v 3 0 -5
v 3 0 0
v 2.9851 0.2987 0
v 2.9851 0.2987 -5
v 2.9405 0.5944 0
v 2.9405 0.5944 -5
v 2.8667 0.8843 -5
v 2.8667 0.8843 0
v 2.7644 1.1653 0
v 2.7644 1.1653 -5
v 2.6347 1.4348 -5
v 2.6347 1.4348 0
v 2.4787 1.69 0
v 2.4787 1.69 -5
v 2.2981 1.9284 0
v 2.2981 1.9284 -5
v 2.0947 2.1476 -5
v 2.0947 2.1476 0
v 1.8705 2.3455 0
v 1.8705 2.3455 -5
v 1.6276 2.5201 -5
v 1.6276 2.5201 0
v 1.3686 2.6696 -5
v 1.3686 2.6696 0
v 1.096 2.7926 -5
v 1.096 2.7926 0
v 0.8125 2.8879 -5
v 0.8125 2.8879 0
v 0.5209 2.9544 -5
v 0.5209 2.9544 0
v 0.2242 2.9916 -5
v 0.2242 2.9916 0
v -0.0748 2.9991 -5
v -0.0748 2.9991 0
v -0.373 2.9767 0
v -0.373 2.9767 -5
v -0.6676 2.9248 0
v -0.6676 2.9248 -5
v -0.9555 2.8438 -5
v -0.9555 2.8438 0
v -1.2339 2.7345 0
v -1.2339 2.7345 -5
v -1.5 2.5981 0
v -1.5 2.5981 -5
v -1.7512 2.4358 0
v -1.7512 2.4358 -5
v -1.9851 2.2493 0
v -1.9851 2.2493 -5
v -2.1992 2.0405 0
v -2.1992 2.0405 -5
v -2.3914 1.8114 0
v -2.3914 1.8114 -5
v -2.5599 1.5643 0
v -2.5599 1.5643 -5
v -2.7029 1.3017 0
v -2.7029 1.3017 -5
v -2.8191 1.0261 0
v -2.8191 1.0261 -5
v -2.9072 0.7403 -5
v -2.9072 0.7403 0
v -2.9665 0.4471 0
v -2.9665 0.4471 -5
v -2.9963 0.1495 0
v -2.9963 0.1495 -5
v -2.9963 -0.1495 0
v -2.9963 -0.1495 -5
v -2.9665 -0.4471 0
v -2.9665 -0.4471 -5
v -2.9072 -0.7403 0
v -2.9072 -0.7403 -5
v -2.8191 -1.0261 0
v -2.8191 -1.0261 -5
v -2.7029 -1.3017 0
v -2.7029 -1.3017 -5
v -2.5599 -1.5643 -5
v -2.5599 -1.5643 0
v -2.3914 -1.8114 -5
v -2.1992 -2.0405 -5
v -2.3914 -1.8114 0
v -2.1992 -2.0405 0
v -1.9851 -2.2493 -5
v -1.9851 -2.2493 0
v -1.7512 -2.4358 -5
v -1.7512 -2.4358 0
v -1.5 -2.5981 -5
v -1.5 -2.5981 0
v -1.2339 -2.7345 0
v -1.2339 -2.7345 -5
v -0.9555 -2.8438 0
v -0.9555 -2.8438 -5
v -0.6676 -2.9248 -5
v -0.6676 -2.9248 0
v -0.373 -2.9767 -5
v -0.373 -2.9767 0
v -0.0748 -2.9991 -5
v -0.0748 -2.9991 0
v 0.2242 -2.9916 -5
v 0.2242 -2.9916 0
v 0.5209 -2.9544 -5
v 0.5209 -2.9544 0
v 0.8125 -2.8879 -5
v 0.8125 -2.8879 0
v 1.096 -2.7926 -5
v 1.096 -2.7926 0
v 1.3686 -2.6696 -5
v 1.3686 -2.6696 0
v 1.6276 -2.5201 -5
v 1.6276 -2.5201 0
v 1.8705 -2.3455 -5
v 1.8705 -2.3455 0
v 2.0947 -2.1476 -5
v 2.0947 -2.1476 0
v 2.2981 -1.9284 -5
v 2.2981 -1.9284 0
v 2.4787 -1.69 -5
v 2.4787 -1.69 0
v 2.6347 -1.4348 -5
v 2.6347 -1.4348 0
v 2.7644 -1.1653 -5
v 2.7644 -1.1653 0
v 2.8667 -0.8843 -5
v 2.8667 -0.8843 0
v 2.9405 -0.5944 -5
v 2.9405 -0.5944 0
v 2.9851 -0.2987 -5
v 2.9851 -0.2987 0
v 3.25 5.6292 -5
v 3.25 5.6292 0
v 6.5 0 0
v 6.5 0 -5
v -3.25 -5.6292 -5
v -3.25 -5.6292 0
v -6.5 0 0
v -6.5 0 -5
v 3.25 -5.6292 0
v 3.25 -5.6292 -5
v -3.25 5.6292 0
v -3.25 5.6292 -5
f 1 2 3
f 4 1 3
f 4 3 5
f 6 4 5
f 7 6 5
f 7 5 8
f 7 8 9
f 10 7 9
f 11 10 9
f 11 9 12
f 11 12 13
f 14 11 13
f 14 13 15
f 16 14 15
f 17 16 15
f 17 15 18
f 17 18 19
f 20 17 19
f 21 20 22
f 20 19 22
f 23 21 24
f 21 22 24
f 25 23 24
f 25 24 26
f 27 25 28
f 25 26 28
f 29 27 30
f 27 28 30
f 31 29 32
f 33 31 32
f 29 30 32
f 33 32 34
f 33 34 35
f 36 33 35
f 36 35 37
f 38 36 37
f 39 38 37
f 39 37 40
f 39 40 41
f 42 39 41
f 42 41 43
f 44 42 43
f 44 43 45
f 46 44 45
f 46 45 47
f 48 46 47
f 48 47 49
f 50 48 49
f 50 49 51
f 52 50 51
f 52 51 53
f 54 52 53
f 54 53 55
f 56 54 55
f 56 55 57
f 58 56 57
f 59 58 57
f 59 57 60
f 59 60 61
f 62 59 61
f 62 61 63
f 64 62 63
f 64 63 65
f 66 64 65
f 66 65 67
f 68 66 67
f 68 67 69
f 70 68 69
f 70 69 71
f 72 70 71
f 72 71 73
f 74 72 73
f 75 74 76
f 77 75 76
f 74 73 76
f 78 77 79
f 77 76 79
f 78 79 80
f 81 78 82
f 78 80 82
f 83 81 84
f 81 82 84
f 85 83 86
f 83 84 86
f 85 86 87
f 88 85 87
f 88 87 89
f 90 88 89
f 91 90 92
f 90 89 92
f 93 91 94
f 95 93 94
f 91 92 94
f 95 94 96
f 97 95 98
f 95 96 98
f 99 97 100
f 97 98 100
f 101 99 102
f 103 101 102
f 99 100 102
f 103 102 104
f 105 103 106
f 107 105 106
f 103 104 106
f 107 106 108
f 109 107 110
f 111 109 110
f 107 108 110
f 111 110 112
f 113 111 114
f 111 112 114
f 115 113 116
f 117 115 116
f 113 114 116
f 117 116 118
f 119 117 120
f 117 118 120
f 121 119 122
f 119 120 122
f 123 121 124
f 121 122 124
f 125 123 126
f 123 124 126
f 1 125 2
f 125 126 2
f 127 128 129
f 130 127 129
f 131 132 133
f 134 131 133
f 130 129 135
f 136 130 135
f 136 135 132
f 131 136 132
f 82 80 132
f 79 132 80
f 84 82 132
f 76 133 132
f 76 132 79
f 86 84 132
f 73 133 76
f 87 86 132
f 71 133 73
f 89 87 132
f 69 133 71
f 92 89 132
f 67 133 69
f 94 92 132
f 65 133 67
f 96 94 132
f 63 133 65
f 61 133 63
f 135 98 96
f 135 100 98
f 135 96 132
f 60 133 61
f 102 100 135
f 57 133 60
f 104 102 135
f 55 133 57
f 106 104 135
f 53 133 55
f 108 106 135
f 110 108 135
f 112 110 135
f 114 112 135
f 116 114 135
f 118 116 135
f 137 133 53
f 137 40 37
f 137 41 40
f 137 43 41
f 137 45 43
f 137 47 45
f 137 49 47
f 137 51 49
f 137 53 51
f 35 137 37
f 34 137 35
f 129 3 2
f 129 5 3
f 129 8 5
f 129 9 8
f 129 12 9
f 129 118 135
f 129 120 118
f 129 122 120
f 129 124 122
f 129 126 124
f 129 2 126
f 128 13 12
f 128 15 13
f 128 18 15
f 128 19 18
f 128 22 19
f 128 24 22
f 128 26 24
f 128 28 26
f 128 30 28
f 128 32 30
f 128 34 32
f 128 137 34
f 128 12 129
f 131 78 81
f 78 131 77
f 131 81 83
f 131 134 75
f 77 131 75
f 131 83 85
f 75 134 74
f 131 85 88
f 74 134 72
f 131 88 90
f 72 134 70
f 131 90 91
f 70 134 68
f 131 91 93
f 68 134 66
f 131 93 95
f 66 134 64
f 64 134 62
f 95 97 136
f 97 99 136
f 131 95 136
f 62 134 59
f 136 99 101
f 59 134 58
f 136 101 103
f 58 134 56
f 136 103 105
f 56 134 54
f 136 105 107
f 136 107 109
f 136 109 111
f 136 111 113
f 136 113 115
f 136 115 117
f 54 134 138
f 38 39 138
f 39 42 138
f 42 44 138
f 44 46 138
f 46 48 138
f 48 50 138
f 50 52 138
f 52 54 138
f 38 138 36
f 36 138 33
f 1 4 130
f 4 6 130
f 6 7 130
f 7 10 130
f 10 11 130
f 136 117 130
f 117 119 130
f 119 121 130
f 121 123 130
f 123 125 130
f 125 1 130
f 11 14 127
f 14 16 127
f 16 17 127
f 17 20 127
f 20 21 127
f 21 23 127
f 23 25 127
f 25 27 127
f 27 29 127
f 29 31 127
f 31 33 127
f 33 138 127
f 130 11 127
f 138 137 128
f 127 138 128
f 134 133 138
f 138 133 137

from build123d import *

# Parameters (mm, degrees)
F0_R     = 6.5
F1_DEPTH = 5
F3_DEPTH = 5.001
F4_R     = 3
F5_DEPTH = 5.001


with BuildPart() as f1:
    # F0 (on Top) → F1 (new body)
    with BuildSketch(Plane.XY):
        Circle(F0_R)
    extrude(amount=-F1_DEPTH)

    # F2 (on face) → F3 (cut, through all)
    with BuildSketch(Plane.XY):
        with BuildLine():
            Line((-3.25, 5.629165), (3.25, 5.629165))
            ThreePointArc((3.25, 5.629165), (0, 6.5), (-3.25, 5.629165))
        make_face()
        with BuildLine():
            Line((-6.5, 0), (-3.25, 5.629165))
            ThreePointArc((-3.25, 5.629165), (-5.629165, 3.25), (-6.5, 0))
        make_face()
        with BuildLine():
            ThreePointArc((-6.5, 0), (-5.629165, -3.25), (-3.25, -5.629165))
            Line((-3.25, -5.629165), (-6.5, 0))
        make_face()
        with BuildLine():
            ThreePointArc((-3.25, -5.629165), (0, -6.5), (3.25, -5.629165))
            Line((3.25, -5.629165), (-3.25, -5.629165))
        make_face()
        with BuildLine():
            ThreePointArc((3.25, -5.629165), (5.629165, -3.25), (6.5, 0))
            Line((6.5, 0), (3.25, -5.629165))
        make_face()
        with BuildLine():
            Line((3.25, 5.629165), (6.5, 0))
            ThreePointArc((6.5, 0), (5.629165, 3.25), (3.25, 5.629165))
        make_face()
    extrude(amount=-F3_DEPTH, mode=Mode.SUBTRACT)

    # F4 (on face) → F5 (cut, through all)
    with BuildSketch(Plane.XY):
        Circle(F4_R)
    extrude(amount=-F5_DEPTH, mode=Mode.SUBTRACT)


solid = f1.part
